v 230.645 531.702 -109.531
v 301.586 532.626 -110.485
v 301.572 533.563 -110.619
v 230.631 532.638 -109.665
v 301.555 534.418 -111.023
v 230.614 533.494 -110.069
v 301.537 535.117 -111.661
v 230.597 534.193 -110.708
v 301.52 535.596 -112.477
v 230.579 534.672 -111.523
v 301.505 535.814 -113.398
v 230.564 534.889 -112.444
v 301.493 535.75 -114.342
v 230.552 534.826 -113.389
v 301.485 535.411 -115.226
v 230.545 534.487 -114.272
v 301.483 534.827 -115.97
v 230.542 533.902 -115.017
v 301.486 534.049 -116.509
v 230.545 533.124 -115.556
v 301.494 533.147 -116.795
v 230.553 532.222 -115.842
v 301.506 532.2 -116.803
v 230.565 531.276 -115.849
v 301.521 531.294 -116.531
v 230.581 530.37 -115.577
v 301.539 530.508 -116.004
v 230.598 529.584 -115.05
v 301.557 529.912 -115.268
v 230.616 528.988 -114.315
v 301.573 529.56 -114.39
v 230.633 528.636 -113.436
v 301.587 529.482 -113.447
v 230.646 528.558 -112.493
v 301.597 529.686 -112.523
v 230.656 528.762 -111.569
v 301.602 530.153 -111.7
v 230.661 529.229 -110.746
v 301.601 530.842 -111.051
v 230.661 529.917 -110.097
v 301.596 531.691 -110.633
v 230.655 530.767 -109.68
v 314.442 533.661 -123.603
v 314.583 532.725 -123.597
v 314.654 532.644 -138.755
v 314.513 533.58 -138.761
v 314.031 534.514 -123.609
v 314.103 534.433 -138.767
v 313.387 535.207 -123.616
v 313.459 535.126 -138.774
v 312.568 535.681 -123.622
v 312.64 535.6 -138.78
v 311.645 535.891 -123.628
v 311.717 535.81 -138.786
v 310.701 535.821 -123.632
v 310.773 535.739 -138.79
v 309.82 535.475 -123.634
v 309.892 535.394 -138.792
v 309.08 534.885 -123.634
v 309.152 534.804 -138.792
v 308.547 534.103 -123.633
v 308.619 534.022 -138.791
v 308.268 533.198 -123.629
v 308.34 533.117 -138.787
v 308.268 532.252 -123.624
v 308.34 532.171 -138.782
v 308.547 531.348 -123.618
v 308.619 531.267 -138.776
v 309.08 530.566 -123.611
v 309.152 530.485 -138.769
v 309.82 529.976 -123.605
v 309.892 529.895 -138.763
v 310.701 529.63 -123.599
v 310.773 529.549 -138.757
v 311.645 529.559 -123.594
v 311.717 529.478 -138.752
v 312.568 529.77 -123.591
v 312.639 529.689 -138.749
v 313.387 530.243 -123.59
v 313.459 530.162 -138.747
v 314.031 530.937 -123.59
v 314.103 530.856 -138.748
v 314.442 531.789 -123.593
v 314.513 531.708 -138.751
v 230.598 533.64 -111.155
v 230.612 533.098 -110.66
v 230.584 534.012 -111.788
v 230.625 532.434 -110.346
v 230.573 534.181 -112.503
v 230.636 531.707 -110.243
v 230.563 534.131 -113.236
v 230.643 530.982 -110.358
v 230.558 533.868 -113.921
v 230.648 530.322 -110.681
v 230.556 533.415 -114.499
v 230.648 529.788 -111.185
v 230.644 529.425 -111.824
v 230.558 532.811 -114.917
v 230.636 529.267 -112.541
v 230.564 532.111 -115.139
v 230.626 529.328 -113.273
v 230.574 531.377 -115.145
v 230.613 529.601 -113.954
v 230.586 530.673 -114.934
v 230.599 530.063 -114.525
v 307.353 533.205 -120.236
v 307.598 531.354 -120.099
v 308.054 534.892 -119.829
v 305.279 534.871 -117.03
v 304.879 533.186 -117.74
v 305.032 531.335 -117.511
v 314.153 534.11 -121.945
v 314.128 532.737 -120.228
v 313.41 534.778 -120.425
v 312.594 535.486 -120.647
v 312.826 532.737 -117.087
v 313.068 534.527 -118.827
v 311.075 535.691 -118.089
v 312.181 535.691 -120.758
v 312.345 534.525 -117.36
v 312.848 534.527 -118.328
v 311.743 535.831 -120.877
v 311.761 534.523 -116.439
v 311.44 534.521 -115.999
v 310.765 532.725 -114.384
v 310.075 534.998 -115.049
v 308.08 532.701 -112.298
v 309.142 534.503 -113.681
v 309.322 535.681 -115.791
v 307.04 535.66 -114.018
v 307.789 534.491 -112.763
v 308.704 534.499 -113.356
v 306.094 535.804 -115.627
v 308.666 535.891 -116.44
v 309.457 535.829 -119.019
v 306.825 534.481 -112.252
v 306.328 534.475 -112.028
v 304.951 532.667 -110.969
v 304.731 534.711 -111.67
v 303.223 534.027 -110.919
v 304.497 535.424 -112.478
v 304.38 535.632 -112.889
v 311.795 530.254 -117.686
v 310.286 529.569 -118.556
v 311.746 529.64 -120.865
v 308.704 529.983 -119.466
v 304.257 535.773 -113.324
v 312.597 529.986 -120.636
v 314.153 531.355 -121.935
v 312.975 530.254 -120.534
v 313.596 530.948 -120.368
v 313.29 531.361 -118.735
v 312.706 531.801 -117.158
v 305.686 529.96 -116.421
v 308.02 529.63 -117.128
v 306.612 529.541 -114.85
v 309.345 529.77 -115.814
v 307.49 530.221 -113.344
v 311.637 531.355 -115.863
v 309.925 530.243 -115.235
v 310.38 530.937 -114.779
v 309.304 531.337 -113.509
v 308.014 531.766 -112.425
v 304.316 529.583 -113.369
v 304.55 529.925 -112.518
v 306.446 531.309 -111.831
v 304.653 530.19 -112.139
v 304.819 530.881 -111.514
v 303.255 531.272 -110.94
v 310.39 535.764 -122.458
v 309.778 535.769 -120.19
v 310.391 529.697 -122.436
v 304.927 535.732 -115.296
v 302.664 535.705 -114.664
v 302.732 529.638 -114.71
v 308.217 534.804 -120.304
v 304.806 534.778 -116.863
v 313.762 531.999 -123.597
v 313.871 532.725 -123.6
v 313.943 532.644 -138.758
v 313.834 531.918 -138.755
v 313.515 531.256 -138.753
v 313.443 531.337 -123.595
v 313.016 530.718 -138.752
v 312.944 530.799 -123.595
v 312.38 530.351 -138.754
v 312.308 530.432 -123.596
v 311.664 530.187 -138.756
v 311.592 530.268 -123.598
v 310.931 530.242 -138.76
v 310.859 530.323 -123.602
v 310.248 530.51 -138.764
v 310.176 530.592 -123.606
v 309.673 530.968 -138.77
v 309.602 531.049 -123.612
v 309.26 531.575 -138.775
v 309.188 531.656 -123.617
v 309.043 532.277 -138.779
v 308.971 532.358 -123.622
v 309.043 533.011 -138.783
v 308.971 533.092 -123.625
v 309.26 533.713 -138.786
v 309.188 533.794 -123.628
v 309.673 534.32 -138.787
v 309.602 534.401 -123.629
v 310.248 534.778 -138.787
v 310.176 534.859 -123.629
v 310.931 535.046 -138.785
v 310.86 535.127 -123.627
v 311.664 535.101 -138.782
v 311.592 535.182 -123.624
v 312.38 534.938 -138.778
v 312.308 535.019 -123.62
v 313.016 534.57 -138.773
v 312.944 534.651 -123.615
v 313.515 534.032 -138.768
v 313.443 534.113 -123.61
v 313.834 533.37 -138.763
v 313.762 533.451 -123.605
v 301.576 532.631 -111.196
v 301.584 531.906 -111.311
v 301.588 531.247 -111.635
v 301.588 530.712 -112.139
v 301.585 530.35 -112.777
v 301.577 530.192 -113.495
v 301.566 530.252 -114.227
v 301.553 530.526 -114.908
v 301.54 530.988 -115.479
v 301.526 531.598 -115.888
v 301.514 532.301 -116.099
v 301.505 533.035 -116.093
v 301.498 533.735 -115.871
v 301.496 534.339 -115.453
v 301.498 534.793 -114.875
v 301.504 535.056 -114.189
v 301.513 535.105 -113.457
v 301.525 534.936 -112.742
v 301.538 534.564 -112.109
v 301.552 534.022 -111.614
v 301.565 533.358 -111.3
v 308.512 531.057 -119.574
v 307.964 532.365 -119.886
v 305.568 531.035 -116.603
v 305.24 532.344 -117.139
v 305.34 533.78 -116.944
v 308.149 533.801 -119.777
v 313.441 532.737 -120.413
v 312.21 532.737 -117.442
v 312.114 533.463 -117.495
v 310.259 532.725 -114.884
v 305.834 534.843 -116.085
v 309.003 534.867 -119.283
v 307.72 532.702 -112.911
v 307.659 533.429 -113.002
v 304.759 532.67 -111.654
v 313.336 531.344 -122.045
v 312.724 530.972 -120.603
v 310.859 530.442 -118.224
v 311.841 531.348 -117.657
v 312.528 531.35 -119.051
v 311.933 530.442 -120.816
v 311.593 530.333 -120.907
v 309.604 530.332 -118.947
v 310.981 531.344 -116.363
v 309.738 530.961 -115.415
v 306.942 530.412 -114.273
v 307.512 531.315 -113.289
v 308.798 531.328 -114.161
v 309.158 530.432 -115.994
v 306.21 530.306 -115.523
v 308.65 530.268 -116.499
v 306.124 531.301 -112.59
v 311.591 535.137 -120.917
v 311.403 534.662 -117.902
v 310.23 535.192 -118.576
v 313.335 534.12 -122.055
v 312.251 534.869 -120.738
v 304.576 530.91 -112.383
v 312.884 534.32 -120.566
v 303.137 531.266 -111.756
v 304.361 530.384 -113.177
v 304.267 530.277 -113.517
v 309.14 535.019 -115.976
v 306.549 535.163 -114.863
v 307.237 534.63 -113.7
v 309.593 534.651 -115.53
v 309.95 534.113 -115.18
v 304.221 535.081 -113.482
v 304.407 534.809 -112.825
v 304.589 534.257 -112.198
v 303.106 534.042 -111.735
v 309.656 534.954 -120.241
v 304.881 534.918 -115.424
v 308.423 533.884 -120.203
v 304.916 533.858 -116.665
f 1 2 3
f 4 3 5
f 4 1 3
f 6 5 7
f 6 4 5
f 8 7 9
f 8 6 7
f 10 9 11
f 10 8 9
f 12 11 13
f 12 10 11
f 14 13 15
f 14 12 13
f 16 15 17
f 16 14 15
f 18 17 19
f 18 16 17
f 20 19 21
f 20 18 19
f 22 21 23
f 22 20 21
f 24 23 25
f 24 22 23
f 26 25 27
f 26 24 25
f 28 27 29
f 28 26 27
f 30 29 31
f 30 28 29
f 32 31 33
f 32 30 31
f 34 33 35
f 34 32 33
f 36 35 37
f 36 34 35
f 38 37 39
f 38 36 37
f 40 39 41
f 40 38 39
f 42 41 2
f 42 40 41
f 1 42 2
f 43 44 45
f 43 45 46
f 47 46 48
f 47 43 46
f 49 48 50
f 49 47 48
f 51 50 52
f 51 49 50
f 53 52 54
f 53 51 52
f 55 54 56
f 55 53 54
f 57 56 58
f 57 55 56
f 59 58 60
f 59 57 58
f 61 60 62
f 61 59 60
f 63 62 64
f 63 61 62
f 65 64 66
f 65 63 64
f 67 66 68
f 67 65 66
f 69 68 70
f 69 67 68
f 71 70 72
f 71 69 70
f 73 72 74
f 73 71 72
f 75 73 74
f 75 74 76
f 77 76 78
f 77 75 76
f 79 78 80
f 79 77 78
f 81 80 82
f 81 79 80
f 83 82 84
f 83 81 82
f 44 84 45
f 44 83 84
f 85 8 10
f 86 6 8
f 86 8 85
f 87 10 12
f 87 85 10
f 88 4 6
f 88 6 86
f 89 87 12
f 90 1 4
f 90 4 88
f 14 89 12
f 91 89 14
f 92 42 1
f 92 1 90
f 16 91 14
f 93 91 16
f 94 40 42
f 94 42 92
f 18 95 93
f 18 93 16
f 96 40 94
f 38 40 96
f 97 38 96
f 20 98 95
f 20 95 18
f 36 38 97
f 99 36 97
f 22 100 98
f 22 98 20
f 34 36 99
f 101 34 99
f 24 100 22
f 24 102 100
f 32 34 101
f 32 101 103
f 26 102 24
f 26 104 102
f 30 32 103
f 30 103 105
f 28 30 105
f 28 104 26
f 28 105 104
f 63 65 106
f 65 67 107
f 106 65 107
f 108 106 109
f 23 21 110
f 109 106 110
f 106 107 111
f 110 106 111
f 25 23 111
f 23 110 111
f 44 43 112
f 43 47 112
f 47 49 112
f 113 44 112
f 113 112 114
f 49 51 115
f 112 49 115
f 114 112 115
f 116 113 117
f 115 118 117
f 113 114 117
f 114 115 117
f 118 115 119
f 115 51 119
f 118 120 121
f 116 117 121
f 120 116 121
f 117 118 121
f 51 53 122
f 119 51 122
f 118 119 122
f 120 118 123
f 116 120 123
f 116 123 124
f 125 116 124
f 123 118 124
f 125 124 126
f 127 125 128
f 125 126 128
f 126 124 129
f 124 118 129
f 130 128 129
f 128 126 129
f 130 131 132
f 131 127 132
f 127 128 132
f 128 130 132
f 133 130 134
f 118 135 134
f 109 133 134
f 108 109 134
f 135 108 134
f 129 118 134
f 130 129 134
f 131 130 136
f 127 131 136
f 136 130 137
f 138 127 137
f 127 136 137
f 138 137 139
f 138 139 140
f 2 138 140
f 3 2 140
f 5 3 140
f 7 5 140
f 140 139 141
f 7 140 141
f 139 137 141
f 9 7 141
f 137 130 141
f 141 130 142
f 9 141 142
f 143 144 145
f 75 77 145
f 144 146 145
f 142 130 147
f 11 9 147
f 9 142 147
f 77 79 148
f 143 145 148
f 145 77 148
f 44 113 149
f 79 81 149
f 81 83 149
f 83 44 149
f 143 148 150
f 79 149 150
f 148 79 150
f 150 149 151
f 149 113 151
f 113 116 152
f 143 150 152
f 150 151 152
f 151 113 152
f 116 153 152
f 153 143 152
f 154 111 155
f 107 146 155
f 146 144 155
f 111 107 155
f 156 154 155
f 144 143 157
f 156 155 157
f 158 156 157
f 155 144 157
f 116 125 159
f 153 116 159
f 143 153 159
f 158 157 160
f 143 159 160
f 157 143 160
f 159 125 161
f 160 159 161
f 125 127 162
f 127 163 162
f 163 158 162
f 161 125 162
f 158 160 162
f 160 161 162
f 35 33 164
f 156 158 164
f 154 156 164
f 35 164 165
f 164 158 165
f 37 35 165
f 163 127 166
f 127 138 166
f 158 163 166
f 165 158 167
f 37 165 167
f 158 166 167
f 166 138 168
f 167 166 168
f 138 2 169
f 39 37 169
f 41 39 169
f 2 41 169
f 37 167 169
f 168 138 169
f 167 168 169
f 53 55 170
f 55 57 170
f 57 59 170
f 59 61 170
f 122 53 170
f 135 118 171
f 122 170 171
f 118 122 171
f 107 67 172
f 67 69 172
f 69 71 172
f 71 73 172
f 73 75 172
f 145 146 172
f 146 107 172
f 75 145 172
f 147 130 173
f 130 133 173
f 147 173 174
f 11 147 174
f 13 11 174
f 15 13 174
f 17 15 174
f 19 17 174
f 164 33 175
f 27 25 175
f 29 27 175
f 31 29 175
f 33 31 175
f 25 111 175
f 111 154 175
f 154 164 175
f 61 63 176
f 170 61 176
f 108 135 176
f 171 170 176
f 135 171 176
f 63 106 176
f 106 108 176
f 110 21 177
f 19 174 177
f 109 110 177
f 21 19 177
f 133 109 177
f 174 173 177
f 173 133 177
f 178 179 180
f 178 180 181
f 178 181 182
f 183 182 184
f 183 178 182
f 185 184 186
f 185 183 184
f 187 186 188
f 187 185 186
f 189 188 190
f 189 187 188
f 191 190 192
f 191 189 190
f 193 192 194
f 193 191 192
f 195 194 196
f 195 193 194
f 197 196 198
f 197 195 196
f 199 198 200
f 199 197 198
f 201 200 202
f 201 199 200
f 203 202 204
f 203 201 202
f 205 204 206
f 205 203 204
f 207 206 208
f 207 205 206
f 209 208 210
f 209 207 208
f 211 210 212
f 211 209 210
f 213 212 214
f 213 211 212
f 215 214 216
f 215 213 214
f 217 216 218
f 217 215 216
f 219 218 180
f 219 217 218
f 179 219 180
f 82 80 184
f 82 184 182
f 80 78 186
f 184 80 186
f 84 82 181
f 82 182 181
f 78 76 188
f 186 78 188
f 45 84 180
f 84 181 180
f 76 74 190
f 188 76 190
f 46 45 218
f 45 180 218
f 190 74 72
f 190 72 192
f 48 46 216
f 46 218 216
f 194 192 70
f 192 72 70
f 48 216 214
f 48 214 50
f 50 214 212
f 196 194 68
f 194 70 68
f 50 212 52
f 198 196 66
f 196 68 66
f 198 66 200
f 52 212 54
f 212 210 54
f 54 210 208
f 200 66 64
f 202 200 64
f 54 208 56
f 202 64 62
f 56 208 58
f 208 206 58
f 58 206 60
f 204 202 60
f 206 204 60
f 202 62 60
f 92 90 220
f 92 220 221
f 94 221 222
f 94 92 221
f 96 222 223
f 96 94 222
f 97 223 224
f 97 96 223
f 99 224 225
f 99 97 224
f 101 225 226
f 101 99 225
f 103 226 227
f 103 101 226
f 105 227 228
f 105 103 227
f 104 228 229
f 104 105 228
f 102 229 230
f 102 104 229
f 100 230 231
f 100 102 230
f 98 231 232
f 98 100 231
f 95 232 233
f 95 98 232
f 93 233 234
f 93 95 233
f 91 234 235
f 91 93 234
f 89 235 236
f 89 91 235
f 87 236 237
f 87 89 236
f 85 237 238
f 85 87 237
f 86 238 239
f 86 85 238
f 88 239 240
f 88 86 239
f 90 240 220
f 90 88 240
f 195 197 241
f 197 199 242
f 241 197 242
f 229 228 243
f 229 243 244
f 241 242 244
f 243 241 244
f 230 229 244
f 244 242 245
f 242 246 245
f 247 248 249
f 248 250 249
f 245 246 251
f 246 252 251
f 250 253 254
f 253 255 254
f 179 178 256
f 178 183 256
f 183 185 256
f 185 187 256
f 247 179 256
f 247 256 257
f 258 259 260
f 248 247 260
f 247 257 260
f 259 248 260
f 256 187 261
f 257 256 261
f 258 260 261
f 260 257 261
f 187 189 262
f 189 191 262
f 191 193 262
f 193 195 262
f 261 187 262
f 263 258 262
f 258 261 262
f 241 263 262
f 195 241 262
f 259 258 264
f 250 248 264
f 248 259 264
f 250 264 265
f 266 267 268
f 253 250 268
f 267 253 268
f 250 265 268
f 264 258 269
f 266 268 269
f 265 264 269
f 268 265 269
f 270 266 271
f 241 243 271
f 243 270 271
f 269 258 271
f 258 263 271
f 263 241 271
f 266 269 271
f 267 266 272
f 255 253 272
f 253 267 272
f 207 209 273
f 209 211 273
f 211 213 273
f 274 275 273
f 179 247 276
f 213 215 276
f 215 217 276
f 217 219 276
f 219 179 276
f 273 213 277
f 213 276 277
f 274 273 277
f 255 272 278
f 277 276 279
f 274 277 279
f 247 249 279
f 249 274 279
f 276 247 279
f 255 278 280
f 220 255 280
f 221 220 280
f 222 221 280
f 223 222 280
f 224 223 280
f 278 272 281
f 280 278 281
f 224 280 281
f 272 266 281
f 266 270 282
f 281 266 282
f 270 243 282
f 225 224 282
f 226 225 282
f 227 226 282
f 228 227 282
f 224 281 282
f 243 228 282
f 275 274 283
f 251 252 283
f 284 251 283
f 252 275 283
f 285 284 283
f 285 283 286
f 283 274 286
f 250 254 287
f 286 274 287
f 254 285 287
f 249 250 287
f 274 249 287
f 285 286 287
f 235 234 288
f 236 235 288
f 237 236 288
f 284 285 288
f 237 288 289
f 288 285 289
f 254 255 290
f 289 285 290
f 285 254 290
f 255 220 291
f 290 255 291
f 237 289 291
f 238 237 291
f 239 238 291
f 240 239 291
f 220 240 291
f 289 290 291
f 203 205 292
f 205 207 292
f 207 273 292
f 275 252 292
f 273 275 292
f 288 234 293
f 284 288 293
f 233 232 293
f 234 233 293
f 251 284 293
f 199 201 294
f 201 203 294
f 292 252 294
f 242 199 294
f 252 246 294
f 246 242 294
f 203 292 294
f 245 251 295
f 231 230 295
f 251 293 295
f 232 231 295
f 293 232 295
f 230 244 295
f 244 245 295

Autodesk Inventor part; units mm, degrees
ref_plane "YZ Plane" through (0, 0, 0) normal (1, 0, 0) x (0, 1, 0)
ref_plane "XZ Plane" through (0, 0, 0) normal (0, 1, 0) x (-1, 0, 0)
ref_plane "Work Plane5" through (311.4795, 532.6441, -138.7699) normal (-0.0047, 0.0053, 1) x (1, 0, 0.0047)
sketch "Sketch5" plane through (311.4795, 532.6441, -138.7699) normal (-0.0047, 0.0053, 1) x (1, 0, 0.0047)
  circle A0 centre (0, 0) radius 3.175
  circle A1 centre (0, 0) radius 2.4638
sketch3d "3D Sketch3"
  line L0 (311.4795, 532.6441, -138.7699) -> (311.4077, 532.7252, -123.612)
  arc A0 (311.4077, 532.7252, -123.612) -> (301.5425, 532.6498, -113.6598) centre (301.4088, 532.5939, -123.6587) ccw
  line L1 (301.5425, 532.6498, -113.6598) -> (230.602, 531.7255, -112.7061)
  dimension "d12" = 9.9999
sweep "Sweep3" add profiles "Sketch5" path "3D Sketch3"
equation "\"OD\" = 6.35"
equation "\"t\" = 0.7112"
equation "\"L\" = PL"
equation "\"ID\" = 4.9276"
equation "\"PL\" = 101.6254"
equation "\"D\" = 15.24"
equation "\"Size_Designation\" = 1.2345"
properties material "Stainless Steel"
